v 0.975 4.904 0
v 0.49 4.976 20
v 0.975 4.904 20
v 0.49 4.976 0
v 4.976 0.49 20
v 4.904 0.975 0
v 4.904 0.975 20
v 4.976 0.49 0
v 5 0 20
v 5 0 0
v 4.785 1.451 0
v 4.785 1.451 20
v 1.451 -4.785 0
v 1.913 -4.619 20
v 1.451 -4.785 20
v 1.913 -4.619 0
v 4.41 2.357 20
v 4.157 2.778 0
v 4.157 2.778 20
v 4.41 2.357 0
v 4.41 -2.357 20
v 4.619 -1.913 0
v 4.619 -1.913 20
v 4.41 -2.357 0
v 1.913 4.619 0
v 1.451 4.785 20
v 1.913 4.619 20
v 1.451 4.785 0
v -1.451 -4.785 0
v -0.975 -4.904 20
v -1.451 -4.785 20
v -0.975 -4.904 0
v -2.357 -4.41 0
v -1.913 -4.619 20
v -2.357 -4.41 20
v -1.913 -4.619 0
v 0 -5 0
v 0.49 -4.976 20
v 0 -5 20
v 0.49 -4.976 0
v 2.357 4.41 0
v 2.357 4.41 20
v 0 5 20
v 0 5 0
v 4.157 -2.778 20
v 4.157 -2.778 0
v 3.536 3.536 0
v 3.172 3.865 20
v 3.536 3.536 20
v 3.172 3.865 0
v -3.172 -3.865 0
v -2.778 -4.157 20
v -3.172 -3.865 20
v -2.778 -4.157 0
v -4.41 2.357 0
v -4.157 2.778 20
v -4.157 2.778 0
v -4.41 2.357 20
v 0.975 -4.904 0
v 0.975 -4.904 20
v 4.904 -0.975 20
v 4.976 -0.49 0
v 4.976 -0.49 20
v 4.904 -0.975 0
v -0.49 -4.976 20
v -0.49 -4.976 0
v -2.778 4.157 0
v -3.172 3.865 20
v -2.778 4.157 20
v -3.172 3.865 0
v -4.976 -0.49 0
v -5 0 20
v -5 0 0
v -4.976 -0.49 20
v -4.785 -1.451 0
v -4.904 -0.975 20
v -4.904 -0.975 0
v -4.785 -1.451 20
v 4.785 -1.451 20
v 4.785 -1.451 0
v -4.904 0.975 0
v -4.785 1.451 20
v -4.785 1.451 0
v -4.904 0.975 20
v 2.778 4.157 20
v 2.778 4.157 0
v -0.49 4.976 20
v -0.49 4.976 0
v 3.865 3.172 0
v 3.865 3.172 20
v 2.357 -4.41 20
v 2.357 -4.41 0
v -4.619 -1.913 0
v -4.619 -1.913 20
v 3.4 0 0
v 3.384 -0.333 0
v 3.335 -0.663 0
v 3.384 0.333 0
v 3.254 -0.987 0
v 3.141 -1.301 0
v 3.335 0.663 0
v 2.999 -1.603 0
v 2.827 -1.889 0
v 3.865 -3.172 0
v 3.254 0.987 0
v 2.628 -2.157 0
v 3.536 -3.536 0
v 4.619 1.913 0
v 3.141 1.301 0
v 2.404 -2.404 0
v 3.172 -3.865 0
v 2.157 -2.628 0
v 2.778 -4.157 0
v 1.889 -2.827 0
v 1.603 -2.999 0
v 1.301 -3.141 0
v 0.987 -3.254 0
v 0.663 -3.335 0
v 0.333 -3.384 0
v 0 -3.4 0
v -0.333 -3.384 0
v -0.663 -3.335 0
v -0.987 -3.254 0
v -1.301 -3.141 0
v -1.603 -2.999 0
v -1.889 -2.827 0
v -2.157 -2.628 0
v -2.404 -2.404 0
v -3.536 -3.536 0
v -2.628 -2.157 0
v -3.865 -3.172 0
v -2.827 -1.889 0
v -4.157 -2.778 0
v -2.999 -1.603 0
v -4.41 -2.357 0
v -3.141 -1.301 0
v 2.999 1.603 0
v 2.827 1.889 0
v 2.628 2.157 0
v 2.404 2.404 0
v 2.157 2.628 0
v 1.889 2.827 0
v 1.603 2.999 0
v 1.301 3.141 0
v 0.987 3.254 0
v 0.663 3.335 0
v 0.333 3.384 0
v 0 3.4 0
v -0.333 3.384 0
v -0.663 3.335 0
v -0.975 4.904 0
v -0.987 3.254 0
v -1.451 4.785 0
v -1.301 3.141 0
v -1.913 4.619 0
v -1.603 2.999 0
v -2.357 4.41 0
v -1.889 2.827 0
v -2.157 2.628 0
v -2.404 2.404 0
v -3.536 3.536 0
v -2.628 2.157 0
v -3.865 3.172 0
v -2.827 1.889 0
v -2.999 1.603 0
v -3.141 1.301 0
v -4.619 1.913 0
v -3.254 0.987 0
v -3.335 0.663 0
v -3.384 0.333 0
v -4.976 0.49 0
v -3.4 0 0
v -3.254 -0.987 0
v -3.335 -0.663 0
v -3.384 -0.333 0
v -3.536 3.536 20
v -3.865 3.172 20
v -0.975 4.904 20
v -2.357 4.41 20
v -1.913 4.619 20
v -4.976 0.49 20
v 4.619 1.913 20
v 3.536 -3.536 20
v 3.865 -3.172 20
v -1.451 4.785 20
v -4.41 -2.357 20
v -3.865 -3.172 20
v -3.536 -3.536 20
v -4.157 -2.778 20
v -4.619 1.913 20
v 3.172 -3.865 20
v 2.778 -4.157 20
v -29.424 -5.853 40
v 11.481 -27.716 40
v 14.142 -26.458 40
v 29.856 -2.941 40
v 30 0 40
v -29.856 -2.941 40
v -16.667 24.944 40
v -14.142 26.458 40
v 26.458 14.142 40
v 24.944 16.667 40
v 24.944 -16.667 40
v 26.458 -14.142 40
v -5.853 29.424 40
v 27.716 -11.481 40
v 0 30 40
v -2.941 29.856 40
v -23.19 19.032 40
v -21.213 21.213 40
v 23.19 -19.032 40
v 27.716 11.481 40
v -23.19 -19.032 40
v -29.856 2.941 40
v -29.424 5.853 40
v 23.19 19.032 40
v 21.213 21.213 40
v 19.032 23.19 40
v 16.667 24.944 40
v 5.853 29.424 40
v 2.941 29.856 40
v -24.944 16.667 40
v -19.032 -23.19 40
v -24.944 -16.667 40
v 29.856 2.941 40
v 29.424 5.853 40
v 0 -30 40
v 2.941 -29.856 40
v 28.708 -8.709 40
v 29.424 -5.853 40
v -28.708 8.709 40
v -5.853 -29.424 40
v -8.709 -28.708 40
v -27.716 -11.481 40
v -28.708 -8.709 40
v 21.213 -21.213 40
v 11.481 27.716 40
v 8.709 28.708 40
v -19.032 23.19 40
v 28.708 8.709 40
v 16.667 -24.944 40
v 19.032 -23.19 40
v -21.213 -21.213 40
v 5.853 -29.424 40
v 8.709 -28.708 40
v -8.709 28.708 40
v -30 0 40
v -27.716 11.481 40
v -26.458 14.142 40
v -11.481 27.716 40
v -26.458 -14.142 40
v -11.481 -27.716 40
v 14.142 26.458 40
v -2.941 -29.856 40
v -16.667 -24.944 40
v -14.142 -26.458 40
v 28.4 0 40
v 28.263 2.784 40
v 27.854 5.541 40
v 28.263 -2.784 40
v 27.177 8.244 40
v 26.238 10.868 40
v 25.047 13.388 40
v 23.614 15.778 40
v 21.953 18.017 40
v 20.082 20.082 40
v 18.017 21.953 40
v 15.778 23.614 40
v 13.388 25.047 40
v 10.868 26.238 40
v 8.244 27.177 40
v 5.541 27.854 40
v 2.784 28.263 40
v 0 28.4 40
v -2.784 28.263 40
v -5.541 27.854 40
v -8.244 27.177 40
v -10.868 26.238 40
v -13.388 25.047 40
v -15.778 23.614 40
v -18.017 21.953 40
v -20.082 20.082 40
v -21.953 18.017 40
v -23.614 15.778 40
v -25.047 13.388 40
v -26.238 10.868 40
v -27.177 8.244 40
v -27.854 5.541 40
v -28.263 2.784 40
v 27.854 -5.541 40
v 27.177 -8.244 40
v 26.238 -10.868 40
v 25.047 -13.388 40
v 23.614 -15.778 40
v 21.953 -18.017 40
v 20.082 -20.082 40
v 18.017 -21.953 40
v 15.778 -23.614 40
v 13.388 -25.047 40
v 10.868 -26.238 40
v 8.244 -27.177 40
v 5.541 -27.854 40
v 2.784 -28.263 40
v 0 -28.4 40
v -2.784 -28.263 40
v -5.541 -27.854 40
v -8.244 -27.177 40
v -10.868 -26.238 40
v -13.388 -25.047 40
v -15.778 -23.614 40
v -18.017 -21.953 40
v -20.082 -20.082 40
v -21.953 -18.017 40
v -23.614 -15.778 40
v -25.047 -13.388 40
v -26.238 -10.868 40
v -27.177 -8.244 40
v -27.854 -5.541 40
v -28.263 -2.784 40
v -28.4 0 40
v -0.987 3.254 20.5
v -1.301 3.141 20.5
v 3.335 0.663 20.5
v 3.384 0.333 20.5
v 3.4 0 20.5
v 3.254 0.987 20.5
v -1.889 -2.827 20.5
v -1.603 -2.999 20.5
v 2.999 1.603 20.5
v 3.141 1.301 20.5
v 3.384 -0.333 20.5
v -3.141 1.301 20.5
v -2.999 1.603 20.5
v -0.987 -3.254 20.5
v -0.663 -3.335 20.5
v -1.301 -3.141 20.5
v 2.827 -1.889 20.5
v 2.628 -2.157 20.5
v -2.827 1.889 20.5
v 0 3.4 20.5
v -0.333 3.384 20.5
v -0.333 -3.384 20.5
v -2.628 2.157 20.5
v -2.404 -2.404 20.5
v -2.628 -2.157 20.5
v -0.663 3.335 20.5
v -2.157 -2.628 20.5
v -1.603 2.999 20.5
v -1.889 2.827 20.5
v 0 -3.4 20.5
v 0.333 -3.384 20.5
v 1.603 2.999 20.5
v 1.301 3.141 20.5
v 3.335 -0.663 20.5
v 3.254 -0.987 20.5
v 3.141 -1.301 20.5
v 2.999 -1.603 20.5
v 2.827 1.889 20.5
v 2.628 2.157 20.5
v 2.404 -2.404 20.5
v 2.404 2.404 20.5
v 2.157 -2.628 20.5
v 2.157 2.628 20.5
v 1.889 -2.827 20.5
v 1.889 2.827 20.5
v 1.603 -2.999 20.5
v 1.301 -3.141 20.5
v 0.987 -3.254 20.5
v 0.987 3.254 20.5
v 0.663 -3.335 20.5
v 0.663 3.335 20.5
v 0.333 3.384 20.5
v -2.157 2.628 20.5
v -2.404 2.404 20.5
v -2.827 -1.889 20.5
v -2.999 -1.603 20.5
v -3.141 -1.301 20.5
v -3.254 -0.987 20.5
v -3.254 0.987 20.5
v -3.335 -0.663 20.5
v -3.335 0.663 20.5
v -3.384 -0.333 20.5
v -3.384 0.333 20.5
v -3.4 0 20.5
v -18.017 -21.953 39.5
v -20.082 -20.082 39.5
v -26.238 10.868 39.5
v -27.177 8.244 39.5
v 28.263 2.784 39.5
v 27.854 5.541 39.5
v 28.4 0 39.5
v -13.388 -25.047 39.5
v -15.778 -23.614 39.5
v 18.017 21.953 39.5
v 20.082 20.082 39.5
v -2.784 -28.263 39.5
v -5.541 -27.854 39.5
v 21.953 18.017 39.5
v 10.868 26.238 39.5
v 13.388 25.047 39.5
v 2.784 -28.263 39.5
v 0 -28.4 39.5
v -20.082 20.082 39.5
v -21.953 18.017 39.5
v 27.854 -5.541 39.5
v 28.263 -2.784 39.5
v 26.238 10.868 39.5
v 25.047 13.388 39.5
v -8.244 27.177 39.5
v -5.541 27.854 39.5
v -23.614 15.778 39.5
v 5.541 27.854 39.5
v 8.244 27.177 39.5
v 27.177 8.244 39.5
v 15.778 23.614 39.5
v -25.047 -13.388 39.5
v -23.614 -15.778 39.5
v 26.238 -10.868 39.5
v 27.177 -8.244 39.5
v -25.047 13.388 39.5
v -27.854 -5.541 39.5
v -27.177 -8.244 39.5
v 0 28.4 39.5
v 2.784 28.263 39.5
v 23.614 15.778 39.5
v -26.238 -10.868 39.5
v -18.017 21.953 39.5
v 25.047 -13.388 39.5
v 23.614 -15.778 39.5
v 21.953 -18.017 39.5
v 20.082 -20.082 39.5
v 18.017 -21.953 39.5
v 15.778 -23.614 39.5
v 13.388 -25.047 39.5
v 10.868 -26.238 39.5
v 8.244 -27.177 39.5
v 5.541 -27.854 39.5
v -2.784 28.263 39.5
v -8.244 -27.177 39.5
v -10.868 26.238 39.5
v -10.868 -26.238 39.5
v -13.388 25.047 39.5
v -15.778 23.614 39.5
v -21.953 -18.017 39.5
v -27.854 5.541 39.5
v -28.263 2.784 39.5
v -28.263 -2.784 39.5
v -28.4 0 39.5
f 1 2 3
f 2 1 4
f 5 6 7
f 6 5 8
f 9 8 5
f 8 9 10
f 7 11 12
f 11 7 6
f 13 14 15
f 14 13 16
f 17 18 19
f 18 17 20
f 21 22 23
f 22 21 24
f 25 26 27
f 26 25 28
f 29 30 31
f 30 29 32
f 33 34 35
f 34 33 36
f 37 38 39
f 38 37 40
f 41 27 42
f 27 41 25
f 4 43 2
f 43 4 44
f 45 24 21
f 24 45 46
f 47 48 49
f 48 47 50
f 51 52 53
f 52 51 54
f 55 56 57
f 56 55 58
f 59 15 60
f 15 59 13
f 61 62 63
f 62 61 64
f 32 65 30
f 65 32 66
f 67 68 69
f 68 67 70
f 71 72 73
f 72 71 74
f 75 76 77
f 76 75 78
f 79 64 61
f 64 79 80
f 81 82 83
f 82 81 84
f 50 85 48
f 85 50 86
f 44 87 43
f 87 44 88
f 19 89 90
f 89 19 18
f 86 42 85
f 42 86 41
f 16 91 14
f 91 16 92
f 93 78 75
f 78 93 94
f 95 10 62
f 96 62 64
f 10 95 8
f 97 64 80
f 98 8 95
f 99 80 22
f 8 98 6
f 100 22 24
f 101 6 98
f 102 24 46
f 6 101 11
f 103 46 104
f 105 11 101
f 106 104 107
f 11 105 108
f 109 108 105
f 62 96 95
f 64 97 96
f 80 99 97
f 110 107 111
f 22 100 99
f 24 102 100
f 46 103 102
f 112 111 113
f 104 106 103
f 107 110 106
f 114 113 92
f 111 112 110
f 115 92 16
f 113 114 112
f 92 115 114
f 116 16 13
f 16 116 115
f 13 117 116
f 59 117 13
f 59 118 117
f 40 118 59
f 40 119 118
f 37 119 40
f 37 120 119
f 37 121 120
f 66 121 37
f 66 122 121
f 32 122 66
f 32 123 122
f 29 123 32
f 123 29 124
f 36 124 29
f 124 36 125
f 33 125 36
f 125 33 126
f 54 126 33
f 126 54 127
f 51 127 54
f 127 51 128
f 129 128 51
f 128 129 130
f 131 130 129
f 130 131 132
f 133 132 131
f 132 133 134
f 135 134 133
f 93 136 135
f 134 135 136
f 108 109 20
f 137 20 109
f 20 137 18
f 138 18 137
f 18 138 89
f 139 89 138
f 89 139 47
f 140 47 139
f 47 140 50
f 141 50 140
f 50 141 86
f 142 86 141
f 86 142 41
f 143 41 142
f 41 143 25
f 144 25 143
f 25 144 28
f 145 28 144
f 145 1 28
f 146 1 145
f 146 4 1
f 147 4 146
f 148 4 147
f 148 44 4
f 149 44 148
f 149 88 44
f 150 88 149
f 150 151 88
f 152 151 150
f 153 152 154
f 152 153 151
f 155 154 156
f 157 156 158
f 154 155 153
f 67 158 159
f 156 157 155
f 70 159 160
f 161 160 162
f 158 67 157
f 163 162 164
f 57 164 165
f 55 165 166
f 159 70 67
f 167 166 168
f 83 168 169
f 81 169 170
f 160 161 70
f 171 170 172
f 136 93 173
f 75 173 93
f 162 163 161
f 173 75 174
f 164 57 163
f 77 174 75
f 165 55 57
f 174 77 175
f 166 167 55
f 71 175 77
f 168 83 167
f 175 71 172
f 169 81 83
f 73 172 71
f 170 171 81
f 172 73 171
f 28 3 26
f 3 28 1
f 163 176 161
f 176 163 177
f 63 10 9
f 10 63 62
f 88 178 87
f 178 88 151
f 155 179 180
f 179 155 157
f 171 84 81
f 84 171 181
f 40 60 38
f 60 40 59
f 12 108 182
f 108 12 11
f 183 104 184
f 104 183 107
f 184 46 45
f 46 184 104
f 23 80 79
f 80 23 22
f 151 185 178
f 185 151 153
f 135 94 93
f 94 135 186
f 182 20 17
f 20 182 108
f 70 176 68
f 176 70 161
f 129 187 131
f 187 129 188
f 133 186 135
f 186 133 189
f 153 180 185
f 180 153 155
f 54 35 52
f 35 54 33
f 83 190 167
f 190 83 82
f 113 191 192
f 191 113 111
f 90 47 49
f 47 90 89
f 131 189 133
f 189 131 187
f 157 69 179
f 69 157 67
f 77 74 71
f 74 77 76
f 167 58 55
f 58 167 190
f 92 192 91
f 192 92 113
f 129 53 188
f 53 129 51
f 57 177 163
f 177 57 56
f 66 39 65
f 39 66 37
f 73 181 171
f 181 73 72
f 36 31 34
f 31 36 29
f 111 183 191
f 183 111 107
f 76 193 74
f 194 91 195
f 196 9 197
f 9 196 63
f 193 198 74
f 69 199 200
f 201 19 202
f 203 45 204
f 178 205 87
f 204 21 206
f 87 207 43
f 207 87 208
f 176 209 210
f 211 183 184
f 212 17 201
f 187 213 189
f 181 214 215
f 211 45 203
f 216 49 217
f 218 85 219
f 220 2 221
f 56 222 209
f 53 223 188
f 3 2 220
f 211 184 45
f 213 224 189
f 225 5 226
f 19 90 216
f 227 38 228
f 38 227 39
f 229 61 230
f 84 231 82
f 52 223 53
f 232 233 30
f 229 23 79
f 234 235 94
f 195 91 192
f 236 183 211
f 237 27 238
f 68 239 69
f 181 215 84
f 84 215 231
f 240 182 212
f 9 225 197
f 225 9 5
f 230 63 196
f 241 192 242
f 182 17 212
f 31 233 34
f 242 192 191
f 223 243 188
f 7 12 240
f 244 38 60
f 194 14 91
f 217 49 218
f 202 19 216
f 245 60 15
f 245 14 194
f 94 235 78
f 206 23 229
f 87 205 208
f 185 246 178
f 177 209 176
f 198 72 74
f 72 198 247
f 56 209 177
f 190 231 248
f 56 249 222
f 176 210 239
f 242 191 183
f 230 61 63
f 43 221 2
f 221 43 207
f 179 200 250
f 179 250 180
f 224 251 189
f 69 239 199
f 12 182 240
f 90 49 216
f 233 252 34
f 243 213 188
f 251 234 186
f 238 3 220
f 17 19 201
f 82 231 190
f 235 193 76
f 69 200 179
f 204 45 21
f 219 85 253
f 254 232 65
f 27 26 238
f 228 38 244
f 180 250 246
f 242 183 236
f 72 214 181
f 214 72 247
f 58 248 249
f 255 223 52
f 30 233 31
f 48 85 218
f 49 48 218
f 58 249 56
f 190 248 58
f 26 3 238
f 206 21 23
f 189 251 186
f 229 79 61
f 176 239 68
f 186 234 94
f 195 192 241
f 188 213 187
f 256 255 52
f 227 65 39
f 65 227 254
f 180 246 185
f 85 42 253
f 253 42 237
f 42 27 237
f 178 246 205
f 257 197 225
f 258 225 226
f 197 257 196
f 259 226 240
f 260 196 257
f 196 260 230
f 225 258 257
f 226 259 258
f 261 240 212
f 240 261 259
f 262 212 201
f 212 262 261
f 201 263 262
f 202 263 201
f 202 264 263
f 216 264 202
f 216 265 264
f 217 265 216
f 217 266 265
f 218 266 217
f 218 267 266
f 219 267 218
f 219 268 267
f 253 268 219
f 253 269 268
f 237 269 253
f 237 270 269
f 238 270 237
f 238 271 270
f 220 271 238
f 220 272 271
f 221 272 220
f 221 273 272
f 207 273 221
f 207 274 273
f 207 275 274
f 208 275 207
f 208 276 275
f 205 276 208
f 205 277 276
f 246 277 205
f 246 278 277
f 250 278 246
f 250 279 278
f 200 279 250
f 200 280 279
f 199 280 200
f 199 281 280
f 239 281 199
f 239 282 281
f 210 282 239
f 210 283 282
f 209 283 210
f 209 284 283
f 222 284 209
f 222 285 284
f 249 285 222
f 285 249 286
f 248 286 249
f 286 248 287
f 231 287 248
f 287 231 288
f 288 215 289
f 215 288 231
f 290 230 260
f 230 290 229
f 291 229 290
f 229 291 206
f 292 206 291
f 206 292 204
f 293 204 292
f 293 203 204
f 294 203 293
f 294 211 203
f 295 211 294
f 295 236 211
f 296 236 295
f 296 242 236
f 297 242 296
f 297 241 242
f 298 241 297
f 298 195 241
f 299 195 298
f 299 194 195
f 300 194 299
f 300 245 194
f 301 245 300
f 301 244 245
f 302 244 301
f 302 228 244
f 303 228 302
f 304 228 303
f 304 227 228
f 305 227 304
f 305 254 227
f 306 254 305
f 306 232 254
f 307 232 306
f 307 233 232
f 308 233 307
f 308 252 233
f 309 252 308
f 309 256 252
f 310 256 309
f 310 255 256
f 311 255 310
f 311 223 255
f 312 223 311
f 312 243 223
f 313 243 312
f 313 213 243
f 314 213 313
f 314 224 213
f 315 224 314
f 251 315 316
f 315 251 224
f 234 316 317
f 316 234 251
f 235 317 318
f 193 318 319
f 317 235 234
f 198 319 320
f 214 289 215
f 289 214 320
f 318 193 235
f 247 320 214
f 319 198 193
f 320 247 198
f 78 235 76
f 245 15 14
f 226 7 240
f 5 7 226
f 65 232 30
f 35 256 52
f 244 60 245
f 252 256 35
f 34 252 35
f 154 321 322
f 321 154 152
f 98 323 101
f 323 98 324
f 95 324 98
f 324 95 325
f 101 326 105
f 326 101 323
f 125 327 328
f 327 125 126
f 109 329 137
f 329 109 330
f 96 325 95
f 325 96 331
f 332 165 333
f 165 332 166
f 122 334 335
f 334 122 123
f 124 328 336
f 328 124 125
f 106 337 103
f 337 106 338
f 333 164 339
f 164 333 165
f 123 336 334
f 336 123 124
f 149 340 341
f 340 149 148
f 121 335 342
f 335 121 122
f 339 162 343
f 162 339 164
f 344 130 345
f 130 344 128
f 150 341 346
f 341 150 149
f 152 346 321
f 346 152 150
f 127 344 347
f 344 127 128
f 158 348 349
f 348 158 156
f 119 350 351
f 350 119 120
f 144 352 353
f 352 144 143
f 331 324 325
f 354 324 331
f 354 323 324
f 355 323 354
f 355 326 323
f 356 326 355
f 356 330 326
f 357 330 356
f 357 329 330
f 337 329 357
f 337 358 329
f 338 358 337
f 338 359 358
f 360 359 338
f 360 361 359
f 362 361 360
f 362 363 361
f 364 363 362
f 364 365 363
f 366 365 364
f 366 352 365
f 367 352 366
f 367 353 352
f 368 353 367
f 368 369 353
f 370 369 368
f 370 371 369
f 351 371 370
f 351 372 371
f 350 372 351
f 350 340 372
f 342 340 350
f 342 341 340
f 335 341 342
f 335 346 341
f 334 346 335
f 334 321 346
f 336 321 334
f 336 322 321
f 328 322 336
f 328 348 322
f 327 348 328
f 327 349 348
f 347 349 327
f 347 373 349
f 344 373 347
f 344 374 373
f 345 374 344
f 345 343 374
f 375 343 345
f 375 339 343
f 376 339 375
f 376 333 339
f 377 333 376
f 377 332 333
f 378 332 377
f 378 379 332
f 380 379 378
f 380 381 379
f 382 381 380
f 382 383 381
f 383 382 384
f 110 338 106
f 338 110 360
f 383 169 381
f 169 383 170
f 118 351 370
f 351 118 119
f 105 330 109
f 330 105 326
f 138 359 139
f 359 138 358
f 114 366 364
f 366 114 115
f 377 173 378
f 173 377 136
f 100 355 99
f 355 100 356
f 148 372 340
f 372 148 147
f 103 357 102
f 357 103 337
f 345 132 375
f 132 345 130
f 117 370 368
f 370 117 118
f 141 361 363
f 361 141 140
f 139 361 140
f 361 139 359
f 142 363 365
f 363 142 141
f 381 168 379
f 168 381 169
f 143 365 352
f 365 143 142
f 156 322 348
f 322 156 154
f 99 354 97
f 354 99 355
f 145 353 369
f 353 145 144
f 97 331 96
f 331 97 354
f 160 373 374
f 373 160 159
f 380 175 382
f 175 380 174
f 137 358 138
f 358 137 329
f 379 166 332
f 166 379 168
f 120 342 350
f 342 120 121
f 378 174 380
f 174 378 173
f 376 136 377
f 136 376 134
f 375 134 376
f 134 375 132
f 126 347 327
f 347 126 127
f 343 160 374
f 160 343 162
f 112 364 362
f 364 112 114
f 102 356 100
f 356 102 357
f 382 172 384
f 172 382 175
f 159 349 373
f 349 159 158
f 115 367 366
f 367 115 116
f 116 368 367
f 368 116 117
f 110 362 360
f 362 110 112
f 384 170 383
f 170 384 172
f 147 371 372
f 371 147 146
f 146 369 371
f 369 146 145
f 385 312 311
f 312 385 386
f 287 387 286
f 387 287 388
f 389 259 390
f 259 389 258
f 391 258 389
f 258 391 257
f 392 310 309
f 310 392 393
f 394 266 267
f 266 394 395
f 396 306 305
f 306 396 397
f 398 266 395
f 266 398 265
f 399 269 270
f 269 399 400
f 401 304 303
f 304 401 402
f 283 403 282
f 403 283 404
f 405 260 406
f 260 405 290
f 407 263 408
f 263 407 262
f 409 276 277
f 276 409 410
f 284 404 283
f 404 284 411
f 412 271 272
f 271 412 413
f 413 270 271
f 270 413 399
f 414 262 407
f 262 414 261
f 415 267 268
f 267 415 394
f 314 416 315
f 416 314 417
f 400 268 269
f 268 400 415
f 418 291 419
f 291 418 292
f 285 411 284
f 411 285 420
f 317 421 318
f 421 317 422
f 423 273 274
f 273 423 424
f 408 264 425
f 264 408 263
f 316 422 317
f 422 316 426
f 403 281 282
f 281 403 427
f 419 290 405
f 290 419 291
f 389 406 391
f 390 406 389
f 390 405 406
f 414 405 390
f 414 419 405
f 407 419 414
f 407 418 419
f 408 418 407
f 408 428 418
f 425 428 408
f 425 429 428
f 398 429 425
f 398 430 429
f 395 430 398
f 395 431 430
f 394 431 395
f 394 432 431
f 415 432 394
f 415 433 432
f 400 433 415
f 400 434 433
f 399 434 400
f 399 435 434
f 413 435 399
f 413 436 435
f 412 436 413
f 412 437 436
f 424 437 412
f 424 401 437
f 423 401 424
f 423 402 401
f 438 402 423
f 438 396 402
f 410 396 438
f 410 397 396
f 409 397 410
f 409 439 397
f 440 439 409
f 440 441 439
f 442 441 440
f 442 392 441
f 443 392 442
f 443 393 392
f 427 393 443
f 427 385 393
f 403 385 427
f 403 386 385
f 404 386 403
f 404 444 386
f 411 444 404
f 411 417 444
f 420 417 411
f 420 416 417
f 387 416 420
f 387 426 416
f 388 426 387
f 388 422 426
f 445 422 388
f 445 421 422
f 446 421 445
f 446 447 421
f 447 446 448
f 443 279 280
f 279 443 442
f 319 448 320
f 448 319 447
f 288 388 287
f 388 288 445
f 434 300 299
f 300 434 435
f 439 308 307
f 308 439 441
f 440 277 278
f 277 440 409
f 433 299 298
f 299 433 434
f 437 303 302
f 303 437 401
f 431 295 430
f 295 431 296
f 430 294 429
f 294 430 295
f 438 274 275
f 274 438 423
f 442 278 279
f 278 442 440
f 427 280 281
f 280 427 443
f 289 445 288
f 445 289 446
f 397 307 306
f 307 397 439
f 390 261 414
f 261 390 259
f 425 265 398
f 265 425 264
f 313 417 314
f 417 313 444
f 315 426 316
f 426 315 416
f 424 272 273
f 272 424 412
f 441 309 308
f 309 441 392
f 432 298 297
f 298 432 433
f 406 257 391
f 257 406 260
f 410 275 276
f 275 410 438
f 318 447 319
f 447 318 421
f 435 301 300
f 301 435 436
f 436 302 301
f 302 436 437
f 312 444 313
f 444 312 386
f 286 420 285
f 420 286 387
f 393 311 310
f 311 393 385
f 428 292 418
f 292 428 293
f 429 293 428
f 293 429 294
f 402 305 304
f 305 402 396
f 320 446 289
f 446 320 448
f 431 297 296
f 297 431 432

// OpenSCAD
// Lab funnel - printed upright, open at top and bottom
// Units: mm

$fn = 64;

// --- Dimensions ---
spout_od      = 10;    // spout outer diameter
spout_id      = spout_od - 2 * 1.6;  // spout bore (6.8 mm)
spout_h       = 20;    // spout height (z = 0 to 20)
cone_od_top   = 60;    // funnel rim outer diameter (z = 50)
wall           = 1.6;   // wall thickness everywhere
eps            = 0.5;   // cutter overshoot past faces

// Derived
cone_od_bot   = spout_od;  // cone starts at spout diameter (z = 20)
cone_h        = spout_h;   // cone runs z = 20 to 50 (height 30)

difference() {
    union() {
        // Spout (tube)
        cylinder(d = spout_od, h = spout_h);
        // Cone: z = 20 (spout top) to z = 50 (rim)
        translate([0, 0, spout_h])
            cylinder(d1 = cone_od_bot, d2 = cone_od_top, h = cone_h);
    }
    // Bottom cutter (through the spout)
    translate([0, 0, -eps])
        cylinder(d = spout_id, h = spout_h + 2 * eps);
    // Top cutter (through the rim)
    translate([0, 0, spout_h + cone_h - eps])
        cylinder(d = cone_od_top - 2 * wall, h = eps);
}
